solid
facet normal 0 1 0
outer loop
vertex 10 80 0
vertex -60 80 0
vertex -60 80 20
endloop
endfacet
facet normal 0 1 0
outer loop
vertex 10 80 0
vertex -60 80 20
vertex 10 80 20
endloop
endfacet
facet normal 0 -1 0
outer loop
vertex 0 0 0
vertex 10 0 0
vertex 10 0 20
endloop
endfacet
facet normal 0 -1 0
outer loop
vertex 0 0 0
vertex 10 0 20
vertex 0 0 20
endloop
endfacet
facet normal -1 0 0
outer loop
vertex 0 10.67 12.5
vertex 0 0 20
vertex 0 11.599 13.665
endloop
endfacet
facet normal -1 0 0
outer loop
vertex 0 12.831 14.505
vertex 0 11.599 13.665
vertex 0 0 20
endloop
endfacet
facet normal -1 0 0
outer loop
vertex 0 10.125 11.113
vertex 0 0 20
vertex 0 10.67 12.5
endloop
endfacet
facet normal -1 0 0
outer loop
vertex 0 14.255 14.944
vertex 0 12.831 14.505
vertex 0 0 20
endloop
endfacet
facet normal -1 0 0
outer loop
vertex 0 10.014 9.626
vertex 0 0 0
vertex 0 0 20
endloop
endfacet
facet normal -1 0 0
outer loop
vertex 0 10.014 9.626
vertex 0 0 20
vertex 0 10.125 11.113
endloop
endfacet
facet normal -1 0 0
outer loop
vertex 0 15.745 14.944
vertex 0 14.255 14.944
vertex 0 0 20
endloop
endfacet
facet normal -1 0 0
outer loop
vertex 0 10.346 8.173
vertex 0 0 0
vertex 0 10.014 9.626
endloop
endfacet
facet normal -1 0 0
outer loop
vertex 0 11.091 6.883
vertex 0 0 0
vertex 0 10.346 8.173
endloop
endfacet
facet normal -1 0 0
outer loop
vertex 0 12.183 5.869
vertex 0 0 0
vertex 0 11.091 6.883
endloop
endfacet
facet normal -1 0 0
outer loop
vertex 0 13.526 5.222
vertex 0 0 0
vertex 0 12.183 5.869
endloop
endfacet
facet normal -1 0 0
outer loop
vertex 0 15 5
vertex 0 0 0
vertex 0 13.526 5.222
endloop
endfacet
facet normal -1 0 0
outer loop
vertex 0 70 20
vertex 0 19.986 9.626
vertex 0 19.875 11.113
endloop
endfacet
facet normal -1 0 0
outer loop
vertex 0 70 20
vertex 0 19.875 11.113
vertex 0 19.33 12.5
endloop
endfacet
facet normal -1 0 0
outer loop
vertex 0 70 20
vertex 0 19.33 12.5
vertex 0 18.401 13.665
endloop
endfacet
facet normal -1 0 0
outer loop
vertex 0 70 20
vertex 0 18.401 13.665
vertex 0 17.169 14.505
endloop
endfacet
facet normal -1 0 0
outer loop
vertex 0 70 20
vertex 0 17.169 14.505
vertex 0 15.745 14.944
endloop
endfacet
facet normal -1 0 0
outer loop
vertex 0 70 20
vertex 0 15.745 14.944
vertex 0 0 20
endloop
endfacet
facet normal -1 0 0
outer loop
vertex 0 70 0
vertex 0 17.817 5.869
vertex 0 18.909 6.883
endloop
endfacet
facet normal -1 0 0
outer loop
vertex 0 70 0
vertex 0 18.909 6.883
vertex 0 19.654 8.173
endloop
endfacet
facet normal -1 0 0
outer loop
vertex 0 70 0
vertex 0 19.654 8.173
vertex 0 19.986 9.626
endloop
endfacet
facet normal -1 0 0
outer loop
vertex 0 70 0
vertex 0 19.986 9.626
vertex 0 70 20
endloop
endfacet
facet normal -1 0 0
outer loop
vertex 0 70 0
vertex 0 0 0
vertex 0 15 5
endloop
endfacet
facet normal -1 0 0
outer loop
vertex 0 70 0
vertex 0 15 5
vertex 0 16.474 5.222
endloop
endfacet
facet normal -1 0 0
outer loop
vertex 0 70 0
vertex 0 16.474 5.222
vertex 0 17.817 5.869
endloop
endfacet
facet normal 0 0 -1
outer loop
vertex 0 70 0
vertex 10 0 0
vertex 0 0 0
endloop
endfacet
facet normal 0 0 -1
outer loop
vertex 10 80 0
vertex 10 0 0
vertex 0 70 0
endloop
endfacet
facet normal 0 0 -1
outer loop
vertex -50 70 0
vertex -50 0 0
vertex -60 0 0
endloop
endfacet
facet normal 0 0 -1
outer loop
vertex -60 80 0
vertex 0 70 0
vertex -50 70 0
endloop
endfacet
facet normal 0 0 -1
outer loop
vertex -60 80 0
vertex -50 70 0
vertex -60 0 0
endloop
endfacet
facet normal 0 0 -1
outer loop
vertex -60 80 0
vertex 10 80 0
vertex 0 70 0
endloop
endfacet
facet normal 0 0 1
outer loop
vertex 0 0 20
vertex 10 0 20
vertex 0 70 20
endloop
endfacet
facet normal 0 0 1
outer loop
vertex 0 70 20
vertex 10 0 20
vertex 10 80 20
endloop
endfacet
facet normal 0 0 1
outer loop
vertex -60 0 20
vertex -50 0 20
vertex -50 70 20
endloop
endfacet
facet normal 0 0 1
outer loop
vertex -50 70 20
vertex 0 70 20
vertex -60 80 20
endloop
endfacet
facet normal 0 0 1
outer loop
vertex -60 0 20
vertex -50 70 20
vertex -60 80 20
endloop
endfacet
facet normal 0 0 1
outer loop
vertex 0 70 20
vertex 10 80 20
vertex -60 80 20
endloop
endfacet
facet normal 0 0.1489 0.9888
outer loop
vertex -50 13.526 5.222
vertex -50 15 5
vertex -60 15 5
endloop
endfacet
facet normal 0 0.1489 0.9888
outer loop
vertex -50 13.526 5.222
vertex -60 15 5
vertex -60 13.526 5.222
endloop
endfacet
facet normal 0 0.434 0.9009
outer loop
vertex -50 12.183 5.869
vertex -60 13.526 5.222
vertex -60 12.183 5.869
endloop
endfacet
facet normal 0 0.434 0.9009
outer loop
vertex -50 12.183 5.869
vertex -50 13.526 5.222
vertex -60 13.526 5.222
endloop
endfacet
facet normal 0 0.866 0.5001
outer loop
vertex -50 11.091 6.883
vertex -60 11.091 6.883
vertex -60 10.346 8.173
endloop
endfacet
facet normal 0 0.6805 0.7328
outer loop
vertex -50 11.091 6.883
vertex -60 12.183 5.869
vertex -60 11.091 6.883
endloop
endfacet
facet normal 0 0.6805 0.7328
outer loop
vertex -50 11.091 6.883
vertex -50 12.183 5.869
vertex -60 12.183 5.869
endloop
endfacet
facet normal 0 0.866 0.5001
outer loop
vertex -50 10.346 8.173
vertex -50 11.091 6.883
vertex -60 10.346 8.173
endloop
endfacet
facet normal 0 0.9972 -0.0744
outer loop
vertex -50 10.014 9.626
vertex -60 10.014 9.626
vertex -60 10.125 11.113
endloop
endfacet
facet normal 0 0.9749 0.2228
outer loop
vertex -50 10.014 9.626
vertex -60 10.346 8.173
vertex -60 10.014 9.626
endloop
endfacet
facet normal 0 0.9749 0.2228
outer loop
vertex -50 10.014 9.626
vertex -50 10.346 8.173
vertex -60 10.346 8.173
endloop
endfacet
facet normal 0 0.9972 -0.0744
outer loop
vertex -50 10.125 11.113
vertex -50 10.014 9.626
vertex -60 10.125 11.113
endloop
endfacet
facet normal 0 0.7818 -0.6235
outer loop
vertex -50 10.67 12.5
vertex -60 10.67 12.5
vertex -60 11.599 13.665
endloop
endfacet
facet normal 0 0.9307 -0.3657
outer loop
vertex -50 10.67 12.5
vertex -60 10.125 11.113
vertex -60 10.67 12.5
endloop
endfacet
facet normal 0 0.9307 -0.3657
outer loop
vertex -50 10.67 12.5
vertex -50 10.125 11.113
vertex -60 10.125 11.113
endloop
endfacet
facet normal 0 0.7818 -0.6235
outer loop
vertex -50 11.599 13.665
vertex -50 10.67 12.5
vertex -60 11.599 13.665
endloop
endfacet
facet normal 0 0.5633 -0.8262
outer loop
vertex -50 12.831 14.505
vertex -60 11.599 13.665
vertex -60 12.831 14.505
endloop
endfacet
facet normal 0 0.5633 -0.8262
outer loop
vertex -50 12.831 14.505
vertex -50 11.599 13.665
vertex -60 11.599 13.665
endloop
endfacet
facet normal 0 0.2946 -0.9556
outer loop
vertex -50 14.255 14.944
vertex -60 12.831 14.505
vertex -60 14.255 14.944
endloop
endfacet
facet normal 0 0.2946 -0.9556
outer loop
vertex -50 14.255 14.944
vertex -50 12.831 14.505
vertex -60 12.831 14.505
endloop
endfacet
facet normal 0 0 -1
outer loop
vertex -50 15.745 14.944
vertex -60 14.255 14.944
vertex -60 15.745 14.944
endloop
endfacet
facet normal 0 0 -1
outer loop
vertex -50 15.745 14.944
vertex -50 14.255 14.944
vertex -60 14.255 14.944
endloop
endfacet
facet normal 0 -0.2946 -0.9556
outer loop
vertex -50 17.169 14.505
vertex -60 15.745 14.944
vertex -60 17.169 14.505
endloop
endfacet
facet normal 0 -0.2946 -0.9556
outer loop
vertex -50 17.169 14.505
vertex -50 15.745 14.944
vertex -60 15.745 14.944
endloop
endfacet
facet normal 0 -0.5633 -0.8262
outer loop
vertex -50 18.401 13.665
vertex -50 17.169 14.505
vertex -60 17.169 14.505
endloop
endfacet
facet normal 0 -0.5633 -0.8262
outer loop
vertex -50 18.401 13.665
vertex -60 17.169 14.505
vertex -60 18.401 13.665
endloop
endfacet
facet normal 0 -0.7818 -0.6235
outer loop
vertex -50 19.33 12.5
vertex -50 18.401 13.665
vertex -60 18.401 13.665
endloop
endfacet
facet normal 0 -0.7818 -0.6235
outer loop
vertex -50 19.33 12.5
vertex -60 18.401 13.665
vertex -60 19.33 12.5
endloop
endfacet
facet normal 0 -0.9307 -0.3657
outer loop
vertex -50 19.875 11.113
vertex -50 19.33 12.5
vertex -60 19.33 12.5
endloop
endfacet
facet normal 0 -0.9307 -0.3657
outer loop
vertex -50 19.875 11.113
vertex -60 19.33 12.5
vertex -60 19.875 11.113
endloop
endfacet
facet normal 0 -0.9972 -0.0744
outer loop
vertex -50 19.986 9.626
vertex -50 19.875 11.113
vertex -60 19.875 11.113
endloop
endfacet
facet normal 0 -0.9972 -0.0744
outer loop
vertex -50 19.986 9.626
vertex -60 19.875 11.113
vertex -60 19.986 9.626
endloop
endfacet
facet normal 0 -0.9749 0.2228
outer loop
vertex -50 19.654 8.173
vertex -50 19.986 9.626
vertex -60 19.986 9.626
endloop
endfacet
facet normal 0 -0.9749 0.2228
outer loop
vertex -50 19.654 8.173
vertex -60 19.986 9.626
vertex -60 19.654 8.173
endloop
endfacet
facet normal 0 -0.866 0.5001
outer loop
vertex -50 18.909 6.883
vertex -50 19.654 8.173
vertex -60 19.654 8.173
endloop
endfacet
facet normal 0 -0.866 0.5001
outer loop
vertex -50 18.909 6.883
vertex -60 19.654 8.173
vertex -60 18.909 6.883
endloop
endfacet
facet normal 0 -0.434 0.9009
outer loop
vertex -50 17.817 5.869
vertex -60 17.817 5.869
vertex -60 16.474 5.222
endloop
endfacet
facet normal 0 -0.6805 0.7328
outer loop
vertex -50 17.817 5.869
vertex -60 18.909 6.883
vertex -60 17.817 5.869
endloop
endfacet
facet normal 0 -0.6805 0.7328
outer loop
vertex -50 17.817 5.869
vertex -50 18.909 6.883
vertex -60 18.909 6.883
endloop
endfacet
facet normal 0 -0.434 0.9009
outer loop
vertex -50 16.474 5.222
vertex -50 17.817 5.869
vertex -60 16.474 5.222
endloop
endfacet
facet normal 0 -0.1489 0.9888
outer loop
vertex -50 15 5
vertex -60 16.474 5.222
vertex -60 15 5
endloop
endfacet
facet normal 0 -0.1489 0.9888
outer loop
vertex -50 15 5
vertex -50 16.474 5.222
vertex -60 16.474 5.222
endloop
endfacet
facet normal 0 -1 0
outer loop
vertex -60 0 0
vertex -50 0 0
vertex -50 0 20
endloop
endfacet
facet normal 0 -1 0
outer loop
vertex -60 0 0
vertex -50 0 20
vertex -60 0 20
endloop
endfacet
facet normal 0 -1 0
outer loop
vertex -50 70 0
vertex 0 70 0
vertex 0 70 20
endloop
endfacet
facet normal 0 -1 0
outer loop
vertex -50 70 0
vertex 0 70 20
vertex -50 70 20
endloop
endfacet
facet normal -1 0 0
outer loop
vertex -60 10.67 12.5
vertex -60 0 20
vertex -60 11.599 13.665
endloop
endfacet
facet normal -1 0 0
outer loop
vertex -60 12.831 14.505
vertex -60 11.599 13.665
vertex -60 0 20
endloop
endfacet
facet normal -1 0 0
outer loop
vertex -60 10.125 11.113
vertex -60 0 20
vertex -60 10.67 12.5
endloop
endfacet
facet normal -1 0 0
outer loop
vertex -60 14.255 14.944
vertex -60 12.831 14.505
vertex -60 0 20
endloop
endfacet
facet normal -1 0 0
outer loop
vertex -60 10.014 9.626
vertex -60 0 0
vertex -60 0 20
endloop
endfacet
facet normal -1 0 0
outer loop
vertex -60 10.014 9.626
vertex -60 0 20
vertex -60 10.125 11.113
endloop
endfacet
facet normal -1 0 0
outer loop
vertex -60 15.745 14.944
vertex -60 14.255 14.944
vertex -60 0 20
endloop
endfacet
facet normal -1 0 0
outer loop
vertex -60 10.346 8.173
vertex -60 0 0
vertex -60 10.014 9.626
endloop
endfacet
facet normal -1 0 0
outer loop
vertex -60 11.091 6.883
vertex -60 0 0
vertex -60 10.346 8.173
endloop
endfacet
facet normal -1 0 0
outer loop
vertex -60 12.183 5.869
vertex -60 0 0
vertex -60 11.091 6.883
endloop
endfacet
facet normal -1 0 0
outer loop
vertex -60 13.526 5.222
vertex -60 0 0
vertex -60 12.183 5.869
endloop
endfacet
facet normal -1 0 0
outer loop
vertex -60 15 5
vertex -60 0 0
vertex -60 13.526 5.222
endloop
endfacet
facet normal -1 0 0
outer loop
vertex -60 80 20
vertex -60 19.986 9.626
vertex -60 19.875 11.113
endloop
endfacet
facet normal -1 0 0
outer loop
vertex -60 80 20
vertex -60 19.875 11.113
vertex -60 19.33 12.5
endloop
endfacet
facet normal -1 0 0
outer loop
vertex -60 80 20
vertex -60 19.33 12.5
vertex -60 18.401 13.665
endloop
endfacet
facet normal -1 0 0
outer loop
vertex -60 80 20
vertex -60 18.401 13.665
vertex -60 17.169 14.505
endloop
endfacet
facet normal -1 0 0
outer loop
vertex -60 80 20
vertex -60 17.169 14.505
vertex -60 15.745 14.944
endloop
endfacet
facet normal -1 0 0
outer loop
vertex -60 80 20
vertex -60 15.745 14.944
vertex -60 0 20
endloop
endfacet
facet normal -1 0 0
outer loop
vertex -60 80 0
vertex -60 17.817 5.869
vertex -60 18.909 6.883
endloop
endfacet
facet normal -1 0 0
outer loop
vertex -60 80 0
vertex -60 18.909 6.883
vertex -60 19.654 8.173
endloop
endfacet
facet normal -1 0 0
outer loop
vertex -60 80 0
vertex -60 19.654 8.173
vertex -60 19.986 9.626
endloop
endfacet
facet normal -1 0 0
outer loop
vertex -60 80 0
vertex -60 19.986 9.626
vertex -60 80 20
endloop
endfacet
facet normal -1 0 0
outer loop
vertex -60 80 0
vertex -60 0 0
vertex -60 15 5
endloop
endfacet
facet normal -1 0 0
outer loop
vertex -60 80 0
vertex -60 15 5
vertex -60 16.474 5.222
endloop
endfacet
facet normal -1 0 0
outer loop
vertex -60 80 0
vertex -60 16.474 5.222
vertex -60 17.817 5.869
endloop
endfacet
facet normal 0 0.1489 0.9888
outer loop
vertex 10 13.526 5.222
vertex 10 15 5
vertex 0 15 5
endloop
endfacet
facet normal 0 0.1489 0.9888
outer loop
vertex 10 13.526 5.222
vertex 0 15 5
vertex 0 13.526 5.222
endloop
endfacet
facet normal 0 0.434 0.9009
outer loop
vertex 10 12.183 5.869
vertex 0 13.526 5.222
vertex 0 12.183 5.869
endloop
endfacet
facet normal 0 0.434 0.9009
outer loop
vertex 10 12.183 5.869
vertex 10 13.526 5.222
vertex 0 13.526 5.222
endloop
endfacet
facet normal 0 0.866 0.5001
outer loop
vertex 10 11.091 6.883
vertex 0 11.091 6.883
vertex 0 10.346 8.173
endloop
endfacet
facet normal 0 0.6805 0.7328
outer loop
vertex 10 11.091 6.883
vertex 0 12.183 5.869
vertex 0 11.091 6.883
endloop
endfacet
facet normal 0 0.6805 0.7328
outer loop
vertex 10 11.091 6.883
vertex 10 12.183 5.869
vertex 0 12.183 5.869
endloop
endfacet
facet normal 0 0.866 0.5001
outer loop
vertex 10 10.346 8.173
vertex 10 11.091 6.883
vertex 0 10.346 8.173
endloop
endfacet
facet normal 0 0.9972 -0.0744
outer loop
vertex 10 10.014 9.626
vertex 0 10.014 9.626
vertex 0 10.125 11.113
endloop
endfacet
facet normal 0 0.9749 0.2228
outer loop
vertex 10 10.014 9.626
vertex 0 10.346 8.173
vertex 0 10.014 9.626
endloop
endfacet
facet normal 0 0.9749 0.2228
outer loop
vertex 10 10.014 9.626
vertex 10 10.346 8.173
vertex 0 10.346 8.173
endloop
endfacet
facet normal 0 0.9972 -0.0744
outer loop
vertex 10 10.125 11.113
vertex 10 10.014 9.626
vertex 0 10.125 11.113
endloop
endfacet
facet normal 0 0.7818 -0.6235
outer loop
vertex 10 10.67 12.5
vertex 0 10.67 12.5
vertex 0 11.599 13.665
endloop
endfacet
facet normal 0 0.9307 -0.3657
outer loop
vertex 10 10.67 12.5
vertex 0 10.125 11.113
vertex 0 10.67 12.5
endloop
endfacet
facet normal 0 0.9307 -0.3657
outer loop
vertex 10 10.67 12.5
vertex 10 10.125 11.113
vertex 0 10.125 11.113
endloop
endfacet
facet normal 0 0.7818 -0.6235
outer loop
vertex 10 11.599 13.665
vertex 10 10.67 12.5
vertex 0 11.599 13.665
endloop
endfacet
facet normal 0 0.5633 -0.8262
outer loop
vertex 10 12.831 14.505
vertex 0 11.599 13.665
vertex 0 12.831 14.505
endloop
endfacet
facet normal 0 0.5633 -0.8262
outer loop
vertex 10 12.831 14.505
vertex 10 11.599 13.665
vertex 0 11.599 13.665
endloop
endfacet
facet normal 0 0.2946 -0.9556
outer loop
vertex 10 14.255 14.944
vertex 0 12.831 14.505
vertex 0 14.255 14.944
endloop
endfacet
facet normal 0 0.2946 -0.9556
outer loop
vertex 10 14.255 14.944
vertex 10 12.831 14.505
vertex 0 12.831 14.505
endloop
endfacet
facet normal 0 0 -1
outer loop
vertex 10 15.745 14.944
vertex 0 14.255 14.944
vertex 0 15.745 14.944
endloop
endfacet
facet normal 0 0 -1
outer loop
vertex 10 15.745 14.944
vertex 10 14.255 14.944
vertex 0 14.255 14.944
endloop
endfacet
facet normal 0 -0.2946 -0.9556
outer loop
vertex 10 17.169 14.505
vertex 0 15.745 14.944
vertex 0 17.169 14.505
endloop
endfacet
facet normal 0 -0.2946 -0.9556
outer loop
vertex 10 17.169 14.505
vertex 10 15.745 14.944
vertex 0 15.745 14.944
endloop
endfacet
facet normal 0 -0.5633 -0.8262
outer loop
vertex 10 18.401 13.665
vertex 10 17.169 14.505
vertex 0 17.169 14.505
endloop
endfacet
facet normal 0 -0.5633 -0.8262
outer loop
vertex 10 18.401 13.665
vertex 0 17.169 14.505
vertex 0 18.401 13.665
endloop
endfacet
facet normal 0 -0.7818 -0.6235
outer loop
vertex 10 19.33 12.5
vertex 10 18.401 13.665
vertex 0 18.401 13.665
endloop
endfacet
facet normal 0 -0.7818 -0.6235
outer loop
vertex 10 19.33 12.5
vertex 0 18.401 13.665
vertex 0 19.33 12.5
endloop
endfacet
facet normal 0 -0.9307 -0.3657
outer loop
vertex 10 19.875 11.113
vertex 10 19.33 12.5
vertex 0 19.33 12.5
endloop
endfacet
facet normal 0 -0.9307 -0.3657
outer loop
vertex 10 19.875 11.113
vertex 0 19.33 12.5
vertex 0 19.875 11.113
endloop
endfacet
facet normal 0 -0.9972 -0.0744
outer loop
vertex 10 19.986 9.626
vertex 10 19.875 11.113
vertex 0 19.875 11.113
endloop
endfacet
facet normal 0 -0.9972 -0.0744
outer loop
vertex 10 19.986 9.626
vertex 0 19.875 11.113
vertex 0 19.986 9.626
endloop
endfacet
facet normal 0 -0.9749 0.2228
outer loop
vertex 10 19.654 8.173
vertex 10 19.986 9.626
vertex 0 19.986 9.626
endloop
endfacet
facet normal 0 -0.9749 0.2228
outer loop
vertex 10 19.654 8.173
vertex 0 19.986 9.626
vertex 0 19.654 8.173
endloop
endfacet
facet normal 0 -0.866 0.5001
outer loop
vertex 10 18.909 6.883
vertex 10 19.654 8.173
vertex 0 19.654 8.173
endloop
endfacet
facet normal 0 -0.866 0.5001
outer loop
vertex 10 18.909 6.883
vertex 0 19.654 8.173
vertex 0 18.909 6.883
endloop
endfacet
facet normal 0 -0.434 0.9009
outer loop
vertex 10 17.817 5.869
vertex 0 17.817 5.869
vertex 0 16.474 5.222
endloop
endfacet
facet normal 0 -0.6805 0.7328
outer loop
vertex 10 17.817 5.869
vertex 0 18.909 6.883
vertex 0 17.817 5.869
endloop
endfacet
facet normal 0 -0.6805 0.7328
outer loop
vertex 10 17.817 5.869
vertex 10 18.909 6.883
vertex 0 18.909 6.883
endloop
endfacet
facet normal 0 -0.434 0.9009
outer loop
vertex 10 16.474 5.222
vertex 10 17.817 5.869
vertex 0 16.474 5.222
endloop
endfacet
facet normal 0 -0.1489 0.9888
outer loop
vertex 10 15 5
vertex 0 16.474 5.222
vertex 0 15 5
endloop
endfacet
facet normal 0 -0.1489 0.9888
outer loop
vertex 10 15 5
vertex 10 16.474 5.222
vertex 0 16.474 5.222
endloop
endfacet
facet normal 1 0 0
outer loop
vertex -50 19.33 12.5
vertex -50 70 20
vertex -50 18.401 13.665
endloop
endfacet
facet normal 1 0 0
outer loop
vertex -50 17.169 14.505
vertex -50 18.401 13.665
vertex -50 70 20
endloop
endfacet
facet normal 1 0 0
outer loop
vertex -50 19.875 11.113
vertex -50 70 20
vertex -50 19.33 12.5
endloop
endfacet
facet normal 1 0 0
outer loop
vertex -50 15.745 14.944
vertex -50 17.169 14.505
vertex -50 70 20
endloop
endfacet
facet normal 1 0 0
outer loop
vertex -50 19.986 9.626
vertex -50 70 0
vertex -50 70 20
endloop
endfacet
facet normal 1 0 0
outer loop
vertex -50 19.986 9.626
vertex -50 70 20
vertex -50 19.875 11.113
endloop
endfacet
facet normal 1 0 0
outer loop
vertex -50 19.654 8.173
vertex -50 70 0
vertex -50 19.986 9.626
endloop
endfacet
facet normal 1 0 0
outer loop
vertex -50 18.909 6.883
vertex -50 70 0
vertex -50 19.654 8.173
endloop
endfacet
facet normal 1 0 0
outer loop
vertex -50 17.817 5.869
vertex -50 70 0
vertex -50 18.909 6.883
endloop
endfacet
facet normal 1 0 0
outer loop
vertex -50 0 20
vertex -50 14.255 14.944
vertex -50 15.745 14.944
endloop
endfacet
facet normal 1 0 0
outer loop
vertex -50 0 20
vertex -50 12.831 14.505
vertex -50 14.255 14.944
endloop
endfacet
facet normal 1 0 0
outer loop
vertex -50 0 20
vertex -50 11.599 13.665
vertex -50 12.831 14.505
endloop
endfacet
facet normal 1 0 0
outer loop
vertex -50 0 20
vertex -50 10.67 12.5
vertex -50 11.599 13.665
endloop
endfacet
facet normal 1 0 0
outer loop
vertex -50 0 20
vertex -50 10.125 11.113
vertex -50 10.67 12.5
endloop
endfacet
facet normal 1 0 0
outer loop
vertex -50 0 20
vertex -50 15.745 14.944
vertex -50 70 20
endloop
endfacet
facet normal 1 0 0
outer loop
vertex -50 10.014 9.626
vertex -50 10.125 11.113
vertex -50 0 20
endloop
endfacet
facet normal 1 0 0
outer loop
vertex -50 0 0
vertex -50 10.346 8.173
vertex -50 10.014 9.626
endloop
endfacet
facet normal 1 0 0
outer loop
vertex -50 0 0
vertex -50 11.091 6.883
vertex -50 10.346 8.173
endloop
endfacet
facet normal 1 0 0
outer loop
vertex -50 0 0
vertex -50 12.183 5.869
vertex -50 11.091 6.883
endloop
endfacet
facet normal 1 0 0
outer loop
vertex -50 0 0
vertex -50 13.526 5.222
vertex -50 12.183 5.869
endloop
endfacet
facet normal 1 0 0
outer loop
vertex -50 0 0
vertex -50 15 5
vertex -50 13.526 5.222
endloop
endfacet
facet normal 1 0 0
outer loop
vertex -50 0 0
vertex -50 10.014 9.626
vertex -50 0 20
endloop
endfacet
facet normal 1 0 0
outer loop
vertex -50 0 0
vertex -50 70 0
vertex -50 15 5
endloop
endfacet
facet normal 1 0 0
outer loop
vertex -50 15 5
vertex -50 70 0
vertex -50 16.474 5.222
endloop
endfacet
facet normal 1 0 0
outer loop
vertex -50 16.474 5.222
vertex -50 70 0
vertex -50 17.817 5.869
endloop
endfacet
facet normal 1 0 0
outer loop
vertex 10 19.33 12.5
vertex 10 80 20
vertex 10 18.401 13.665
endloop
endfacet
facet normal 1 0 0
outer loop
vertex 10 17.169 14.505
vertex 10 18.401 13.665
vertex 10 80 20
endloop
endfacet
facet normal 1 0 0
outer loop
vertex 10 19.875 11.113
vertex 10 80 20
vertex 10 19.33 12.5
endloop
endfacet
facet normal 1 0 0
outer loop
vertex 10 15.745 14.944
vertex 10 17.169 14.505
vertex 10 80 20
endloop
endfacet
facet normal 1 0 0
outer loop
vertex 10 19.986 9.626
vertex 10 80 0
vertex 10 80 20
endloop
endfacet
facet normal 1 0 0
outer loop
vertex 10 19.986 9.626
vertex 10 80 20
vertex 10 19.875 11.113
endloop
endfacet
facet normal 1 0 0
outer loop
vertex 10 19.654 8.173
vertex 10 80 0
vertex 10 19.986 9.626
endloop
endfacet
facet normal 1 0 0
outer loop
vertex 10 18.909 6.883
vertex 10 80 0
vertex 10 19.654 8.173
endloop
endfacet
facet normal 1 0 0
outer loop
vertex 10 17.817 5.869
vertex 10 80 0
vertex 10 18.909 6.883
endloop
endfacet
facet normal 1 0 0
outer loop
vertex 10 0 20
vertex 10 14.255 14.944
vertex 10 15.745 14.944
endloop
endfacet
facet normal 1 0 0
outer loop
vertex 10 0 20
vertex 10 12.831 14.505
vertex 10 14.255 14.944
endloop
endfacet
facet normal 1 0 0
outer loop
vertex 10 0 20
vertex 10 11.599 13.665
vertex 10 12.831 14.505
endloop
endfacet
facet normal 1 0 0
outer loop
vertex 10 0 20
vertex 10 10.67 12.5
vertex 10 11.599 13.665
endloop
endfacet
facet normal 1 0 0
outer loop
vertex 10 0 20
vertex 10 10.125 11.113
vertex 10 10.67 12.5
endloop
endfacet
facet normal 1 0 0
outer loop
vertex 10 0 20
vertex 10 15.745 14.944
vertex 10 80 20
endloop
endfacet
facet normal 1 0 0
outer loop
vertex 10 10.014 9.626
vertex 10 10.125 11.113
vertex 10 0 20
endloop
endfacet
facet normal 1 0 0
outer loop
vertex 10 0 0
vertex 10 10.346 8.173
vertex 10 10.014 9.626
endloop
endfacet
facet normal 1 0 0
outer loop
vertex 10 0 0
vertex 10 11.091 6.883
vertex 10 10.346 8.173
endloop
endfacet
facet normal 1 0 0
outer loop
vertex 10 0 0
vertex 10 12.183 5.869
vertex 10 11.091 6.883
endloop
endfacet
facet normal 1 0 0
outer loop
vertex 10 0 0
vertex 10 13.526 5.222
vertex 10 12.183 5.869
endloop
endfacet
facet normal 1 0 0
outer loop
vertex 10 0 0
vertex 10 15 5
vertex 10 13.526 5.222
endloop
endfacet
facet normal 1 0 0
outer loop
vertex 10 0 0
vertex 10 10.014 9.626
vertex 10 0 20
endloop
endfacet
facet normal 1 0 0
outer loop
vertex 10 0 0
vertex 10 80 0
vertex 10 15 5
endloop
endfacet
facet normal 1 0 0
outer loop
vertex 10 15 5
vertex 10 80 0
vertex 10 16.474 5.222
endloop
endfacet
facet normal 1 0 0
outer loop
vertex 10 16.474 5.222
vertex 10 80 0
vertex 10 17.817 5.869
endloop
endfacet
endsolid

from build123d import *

# Parameters (mm, degrees)
BOSS_EXTRUDE1_DEPTH     = 20
CUT_EXTRUDE1_DEPTH      = 102.980390272
CUT_EXTRUDE1_DEPTH_BACK = 102.980390272
SKETCH2_R               = 5


with BuildPart() as part:
    # Sketch1 → Boss-Extrude1 (new body)
    with BuildSketch(Plane.XY):
        Polygon((0, 0), (0, 70), (-50, 70), (-50, 0), (-60, 0), (-60, 80), (10, 80), (10, 0), align=None)
    extrude(amount=BOSS_EXTRUDE1_DEPTH)

    # Sketch2 → Cut-Extrude1 (cut, two sides: drawn at the far end of the back side and taken through both)
    with BuildSketch(Plane.ZY.offset(-CUT_EXTRUDE1_DEPTH_BACK)):
        with Locations(Location((10, 15, 0), (0, 0, 180))):
            Circle(SKETCH2_R)
    extrude(amount=CUT_EXTRUDE1_DEPTH + CUT_EXTRUDE1_DEPTH_BACK, mode=Mode.SUBTRACT)


solid = part.part
